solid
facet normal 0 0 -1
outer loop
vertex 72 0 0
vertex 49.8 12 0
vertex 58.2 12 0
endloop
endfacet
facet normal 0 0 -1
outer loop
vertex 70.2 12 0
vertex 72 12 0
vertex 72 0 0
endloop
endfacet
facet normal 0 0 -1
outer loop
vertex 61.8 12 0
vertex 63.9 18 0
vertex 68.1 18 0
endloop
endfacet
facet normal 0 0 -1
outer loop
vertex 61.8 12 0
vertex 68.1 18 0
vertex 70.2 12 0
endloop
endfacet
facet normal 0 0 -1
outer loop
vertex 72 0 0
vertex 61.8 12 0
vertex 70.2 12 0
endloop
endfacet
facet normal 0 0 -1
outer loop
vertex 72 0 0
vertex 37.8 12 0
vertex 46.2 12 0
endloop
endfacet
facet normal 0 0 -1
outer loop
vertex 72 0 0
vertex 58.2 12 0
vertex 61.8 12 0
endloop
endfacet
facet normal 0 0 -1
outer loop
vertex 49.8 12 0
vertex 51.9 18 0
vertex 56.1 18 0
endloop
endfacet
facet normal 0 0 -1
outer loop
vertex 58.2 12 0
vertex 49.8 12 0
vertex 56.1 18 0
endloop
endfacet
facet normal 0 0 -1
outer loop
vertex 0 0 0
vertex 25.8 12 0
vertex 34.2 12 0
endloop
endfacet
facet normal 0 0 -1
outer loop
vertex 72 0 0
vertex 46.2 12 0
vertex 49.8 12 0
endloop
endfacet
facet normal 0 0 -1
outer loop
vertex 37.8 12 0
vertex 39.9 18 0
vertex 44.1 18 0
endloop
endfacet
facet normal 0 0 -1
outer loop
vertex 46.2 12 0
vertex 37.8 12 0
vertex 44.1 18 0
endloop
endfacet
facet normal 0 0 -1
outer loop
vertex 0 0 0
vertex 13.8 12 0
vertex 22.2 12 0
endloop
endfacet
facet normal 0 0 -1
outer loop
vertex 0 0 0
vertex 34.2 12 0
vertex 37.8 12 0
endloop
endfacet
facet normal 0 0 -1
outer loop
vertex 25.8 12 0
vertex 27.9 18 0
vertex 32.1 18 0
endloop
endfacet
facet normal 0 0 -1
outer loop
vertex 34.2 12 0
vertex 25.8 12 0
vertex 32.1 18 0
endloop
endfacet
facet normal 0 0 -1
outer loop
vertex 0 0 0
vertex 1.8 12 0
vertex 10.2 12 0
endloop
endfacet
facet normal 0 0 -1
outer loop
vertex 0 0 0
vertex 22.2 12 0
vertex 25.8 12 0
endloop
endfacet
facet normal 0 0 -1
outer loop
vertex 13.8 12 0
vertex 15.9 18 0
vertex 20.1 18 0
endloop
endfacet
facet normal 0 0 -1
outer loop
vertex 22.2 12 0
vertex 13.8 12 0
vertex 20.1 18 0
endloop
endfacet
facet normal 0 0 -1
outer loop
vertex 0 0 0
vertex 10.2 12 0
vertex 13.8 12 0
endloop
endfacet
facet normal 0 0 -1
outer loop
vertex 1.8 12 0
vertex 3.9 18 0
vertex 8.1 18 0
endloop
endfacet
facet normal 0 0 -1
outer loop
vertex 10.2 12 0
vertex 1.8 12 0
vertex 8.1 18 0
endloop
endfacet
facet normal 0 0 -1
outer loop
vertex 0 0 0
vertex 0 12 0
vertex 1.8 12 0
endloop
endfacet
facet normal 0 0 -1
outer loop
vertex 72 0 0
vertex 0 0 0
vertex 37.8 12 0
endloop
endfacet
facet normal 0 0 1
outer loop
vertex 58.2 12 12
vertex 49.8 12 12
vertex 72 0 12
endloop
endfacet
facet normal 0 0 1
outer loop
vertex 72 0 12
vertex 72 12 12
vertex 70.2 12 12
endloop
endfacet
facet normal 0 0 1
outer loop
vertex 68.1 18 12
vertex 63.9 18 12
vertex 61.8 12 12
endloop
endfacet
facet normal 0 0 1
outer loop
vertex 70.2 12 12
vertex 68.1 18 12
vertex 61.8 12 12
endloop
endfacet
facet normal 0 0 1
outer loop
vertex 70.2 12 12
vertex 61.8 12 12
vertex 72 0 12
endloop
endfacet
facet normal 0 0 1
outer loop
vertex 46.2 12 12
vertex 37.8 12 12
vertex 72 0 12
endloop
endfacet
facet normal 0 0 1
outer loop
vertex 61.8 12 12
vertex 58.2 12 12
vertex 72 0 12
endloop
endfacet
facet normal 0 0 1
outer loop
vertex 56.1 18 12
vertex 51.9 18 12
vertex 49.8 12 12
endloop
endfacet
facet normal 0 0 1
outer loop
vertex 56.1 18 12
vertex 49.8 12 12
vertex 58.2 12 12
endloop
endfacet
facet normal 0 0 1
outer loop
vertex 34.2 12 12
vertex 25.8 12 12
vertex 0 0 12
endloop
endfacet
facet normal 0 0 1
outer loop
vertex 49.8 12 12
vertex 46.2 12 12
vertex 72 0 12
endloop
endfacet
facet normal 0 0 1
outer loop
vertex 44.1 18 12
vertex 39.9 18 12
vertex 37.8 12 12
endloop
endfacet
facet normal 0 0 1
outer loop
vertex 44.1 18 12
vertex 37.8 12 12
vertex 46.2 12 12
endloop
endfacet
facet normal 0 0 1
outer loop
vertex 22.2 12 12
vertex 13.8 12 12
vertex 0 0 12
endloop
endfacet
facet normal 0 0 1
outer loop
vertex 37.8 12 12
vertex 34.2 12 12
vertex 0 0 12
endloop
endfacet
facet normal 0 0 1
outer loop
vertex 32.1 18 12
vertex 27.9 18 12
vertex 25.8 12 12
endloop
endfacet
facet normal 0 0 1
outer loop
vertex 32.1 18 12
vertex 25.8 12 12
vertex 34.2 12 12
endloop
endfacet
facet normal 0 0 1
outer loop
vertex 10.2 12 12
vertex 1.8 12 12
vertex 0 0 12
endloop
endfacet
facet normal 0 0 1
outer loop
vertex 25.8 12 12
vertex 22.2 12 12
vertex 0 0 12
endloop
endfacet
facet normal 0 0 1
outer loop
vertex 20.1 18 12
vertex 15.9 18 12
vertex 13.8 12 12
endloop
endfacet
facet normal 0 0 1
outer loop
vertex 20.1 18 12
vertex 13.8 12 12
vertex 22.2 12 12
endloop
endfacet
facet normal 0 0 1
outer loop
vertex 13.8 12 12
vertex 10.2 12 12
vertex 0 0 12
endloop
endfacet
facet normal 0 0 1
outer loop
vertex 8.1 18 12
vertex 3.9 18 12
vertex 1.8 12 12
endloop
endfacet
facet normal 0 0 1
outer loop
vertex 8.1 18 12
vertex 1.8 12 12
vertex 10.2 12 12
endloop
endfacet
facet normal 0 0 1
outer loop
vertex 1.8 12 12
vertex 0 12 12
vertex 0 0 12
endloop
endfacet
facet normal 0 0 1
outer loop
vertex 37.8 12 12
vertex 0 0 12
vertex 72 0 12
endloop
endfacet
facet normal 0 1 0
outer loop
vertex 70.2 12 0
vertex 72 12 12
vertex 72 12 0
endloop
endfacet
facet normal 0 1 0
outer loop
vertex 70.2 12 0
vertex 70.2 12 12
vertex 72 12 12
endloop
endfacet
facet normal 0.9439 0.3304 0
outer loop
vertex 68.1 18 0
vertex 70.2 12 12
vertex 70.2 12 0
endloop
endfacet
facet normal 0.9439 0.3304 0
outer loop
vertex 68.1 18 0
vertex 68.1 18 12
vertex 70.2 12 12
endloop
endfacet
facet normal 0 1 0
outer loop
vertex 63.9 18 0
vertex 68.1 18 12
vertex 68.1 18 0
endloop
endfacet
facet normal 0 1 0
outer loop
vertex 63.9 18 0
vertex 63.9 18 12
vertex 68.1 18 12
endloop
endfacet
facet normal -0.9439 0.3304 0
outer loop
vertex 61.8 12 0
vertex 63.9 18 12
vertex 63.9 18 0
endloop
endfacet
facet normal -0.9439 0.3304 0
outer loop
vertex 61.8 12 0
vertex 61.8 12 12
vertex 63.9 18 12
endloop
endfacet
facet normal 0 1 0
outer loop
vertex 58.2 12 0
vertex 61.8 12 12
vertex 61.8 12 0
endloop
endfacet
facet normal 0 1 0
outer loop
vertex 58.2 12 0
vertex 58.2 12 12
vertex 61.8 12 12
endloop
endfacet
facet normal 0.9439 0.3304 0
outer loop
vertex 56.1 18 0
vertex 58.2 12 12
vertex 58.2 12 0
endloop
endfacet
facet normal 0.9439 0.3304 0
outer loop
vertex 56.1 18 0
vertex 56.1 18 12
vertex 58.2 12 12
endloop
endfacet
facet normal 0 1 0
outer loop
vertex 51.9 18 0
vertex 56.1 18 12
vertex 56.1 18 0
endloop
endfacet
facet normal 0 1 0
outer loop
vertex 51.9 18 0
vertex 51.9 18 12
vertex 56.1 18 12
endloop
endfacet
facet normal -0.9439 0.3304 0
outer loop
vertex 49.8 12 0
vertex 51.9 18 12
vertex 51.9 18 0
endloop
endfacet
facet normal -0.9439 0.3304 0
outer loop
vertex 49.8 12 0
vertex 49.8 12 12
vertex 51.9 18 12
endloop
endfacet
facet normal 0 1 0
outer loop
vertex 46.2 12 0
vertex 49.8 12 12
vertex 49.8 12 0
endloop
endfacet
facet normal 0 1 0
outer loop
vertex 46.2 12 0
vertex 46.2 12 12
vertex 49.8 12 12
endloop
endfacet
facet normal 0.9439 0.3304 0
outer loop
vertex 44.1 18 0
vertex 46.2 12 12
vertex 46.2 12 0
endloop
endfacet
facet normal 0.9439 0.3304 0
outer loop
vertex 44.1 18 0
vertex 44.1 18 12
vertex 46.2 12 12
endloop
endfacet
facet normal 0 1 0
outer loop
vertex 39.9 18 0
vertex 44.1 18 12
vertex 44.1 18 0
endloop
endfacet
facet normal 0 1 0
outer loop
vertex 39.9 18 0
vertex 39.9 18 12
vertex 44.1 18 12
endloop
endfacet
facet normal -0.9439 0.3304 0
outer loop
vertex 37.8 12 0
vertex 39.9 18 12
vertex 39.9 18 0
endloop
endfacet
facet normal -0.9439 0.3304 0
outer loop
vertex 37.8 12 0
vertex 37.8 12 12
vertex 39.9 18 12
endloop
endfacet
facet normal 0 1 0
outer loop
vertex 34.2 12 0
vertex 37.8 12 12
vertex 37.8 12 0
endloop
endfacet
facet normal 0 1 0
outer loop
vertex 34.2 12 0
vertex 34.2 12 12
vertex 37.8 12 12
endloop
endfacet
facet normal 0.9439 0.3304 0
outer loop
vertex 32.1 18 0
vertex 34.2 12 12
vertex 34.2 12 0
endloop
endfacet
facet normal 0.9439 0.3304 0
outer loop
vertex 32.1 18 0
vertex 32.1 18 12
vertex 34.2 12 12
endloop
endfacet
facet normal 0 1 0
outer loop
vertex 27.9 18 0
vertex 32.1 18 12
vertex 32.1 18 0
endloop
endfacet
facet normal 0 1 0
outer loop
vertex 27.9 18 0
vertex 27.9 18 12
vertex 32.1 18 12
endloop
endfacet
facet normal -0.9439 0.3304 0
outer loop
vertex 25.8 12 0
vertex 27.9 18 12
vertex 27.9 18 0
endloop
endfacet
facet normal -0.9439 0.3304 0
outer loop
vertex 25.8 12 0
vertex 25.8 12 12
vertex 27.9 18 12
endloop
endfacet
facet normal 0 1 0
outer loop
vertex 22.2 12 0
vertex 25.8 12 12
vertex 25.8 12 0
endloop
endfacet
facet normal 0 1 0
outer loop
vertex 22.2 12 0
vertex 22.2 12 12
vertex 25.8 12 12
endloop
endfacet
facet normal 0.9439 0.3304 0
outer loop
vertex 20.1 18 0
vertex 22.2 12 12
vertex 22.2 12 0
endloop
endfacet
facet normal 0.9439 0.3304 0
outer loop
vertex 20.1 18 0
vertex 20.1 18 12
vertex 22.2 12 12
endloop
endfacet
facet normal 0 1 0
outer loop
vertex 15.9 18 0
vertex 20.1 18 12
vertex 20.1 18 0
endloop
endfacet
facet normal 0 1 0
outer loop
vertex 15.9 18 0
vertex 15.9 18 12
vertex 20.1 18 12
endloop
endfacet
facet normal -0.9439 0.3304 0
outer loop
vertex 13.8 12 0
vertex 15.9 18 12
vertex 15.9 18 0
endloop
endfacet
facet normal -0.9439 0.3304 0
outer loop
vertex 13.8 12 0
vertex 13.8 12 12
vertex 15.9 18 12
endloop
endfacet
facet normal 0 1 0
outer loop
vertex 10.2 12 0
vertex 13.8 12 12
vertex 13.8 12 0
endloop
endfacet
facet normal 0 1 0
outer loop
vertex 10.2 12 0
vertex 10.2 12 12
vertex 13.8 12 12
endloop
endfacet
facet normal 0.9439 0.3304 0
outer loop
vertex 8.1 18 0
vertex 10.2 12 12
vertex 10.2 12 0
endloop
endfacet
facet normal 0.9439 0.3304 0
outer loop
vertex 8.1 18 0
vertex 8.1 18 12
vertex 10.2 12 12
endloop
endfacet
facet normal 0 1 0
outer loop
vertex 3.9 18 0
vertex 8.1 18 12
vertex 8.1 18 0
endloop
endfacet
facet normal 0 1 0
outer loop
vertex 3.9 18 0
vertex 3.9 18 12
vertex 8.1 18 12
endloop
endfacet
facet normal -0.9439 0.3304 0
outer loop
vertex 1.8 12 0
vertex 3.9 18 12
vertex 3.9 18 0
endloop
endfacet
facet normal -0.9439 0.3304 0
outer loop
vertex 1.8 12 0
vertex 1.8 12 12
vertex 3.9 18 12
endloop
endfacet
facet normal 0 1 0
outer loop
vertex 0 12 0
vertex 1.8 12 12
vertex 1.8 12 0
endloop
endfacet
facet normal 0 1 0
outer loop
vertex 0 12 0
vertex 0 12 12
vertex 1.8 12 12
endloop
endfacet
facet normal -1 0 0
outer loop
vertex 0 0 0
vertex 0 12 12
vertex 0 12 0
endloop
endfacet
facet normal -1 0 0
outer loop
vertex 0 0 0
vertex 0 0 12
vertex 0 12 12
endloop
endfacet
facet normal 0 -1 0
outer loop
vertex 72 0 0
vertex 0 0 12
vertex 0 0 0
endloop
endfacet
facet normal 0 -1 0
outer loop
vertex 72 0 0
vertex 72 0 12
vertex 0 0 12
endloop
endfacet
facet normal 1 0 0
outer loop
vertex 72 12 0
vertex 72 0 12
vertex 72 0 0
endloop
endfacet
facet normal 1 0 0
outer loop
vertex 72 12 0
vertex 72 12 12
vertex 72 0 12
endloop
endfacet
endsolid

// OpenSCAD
$fn = 32;

// ----------------------------------------------------------------------
// Gear rack: 6 teeth, pitch 12 mm
// ----------------------------------------------------------------------

// --- parameters (mm) ---
teeth = 6;                // number of teeth
pitch = 12;               // tooth pitch, X
root_w = 8.4;             // tooth width at the root
tip_w = 4.2;              // tooth width at the tip
base_h = 12;              // rack body height, Y
tooth_h = 6;              // tooth height above the body
plate_t = 12;             // rack width, Z (extrusion height)
fit_tol = 0.02;           // declared fit tolerance (prompt contract)
free_tol = 0.2;           // declared free tolerance (prompt contract)

rack_l = teeth * pitch;  // overall length
total_h = base_h + tooth_h;  // overall height

profile = [[0, 0], [72, 0], [72, 12], [70.2, 12], [68.1, 18], [63.9, 18], [61.8, 12], [58.2, 12], [56.1, 18], [51.9, 18], [49.8, 12], [46.2, 12], [44.1, 18], [39.9, 18], [37.8, 12], [34.2, 12], [32.1, 18], [27.9, 18], [25.8, 12], [22.2, 12], [20.1, 18], [15.9, 18], [13.8, 12], [10.2, 12], [8.1, 18], [3.9, 18], [1.8, 12], [0, 12]];  // primary outline, 28 points, counter clockwise

// --- the one profile operation ---
linear_extrude(height = plate_t) polygon(points = profile);
